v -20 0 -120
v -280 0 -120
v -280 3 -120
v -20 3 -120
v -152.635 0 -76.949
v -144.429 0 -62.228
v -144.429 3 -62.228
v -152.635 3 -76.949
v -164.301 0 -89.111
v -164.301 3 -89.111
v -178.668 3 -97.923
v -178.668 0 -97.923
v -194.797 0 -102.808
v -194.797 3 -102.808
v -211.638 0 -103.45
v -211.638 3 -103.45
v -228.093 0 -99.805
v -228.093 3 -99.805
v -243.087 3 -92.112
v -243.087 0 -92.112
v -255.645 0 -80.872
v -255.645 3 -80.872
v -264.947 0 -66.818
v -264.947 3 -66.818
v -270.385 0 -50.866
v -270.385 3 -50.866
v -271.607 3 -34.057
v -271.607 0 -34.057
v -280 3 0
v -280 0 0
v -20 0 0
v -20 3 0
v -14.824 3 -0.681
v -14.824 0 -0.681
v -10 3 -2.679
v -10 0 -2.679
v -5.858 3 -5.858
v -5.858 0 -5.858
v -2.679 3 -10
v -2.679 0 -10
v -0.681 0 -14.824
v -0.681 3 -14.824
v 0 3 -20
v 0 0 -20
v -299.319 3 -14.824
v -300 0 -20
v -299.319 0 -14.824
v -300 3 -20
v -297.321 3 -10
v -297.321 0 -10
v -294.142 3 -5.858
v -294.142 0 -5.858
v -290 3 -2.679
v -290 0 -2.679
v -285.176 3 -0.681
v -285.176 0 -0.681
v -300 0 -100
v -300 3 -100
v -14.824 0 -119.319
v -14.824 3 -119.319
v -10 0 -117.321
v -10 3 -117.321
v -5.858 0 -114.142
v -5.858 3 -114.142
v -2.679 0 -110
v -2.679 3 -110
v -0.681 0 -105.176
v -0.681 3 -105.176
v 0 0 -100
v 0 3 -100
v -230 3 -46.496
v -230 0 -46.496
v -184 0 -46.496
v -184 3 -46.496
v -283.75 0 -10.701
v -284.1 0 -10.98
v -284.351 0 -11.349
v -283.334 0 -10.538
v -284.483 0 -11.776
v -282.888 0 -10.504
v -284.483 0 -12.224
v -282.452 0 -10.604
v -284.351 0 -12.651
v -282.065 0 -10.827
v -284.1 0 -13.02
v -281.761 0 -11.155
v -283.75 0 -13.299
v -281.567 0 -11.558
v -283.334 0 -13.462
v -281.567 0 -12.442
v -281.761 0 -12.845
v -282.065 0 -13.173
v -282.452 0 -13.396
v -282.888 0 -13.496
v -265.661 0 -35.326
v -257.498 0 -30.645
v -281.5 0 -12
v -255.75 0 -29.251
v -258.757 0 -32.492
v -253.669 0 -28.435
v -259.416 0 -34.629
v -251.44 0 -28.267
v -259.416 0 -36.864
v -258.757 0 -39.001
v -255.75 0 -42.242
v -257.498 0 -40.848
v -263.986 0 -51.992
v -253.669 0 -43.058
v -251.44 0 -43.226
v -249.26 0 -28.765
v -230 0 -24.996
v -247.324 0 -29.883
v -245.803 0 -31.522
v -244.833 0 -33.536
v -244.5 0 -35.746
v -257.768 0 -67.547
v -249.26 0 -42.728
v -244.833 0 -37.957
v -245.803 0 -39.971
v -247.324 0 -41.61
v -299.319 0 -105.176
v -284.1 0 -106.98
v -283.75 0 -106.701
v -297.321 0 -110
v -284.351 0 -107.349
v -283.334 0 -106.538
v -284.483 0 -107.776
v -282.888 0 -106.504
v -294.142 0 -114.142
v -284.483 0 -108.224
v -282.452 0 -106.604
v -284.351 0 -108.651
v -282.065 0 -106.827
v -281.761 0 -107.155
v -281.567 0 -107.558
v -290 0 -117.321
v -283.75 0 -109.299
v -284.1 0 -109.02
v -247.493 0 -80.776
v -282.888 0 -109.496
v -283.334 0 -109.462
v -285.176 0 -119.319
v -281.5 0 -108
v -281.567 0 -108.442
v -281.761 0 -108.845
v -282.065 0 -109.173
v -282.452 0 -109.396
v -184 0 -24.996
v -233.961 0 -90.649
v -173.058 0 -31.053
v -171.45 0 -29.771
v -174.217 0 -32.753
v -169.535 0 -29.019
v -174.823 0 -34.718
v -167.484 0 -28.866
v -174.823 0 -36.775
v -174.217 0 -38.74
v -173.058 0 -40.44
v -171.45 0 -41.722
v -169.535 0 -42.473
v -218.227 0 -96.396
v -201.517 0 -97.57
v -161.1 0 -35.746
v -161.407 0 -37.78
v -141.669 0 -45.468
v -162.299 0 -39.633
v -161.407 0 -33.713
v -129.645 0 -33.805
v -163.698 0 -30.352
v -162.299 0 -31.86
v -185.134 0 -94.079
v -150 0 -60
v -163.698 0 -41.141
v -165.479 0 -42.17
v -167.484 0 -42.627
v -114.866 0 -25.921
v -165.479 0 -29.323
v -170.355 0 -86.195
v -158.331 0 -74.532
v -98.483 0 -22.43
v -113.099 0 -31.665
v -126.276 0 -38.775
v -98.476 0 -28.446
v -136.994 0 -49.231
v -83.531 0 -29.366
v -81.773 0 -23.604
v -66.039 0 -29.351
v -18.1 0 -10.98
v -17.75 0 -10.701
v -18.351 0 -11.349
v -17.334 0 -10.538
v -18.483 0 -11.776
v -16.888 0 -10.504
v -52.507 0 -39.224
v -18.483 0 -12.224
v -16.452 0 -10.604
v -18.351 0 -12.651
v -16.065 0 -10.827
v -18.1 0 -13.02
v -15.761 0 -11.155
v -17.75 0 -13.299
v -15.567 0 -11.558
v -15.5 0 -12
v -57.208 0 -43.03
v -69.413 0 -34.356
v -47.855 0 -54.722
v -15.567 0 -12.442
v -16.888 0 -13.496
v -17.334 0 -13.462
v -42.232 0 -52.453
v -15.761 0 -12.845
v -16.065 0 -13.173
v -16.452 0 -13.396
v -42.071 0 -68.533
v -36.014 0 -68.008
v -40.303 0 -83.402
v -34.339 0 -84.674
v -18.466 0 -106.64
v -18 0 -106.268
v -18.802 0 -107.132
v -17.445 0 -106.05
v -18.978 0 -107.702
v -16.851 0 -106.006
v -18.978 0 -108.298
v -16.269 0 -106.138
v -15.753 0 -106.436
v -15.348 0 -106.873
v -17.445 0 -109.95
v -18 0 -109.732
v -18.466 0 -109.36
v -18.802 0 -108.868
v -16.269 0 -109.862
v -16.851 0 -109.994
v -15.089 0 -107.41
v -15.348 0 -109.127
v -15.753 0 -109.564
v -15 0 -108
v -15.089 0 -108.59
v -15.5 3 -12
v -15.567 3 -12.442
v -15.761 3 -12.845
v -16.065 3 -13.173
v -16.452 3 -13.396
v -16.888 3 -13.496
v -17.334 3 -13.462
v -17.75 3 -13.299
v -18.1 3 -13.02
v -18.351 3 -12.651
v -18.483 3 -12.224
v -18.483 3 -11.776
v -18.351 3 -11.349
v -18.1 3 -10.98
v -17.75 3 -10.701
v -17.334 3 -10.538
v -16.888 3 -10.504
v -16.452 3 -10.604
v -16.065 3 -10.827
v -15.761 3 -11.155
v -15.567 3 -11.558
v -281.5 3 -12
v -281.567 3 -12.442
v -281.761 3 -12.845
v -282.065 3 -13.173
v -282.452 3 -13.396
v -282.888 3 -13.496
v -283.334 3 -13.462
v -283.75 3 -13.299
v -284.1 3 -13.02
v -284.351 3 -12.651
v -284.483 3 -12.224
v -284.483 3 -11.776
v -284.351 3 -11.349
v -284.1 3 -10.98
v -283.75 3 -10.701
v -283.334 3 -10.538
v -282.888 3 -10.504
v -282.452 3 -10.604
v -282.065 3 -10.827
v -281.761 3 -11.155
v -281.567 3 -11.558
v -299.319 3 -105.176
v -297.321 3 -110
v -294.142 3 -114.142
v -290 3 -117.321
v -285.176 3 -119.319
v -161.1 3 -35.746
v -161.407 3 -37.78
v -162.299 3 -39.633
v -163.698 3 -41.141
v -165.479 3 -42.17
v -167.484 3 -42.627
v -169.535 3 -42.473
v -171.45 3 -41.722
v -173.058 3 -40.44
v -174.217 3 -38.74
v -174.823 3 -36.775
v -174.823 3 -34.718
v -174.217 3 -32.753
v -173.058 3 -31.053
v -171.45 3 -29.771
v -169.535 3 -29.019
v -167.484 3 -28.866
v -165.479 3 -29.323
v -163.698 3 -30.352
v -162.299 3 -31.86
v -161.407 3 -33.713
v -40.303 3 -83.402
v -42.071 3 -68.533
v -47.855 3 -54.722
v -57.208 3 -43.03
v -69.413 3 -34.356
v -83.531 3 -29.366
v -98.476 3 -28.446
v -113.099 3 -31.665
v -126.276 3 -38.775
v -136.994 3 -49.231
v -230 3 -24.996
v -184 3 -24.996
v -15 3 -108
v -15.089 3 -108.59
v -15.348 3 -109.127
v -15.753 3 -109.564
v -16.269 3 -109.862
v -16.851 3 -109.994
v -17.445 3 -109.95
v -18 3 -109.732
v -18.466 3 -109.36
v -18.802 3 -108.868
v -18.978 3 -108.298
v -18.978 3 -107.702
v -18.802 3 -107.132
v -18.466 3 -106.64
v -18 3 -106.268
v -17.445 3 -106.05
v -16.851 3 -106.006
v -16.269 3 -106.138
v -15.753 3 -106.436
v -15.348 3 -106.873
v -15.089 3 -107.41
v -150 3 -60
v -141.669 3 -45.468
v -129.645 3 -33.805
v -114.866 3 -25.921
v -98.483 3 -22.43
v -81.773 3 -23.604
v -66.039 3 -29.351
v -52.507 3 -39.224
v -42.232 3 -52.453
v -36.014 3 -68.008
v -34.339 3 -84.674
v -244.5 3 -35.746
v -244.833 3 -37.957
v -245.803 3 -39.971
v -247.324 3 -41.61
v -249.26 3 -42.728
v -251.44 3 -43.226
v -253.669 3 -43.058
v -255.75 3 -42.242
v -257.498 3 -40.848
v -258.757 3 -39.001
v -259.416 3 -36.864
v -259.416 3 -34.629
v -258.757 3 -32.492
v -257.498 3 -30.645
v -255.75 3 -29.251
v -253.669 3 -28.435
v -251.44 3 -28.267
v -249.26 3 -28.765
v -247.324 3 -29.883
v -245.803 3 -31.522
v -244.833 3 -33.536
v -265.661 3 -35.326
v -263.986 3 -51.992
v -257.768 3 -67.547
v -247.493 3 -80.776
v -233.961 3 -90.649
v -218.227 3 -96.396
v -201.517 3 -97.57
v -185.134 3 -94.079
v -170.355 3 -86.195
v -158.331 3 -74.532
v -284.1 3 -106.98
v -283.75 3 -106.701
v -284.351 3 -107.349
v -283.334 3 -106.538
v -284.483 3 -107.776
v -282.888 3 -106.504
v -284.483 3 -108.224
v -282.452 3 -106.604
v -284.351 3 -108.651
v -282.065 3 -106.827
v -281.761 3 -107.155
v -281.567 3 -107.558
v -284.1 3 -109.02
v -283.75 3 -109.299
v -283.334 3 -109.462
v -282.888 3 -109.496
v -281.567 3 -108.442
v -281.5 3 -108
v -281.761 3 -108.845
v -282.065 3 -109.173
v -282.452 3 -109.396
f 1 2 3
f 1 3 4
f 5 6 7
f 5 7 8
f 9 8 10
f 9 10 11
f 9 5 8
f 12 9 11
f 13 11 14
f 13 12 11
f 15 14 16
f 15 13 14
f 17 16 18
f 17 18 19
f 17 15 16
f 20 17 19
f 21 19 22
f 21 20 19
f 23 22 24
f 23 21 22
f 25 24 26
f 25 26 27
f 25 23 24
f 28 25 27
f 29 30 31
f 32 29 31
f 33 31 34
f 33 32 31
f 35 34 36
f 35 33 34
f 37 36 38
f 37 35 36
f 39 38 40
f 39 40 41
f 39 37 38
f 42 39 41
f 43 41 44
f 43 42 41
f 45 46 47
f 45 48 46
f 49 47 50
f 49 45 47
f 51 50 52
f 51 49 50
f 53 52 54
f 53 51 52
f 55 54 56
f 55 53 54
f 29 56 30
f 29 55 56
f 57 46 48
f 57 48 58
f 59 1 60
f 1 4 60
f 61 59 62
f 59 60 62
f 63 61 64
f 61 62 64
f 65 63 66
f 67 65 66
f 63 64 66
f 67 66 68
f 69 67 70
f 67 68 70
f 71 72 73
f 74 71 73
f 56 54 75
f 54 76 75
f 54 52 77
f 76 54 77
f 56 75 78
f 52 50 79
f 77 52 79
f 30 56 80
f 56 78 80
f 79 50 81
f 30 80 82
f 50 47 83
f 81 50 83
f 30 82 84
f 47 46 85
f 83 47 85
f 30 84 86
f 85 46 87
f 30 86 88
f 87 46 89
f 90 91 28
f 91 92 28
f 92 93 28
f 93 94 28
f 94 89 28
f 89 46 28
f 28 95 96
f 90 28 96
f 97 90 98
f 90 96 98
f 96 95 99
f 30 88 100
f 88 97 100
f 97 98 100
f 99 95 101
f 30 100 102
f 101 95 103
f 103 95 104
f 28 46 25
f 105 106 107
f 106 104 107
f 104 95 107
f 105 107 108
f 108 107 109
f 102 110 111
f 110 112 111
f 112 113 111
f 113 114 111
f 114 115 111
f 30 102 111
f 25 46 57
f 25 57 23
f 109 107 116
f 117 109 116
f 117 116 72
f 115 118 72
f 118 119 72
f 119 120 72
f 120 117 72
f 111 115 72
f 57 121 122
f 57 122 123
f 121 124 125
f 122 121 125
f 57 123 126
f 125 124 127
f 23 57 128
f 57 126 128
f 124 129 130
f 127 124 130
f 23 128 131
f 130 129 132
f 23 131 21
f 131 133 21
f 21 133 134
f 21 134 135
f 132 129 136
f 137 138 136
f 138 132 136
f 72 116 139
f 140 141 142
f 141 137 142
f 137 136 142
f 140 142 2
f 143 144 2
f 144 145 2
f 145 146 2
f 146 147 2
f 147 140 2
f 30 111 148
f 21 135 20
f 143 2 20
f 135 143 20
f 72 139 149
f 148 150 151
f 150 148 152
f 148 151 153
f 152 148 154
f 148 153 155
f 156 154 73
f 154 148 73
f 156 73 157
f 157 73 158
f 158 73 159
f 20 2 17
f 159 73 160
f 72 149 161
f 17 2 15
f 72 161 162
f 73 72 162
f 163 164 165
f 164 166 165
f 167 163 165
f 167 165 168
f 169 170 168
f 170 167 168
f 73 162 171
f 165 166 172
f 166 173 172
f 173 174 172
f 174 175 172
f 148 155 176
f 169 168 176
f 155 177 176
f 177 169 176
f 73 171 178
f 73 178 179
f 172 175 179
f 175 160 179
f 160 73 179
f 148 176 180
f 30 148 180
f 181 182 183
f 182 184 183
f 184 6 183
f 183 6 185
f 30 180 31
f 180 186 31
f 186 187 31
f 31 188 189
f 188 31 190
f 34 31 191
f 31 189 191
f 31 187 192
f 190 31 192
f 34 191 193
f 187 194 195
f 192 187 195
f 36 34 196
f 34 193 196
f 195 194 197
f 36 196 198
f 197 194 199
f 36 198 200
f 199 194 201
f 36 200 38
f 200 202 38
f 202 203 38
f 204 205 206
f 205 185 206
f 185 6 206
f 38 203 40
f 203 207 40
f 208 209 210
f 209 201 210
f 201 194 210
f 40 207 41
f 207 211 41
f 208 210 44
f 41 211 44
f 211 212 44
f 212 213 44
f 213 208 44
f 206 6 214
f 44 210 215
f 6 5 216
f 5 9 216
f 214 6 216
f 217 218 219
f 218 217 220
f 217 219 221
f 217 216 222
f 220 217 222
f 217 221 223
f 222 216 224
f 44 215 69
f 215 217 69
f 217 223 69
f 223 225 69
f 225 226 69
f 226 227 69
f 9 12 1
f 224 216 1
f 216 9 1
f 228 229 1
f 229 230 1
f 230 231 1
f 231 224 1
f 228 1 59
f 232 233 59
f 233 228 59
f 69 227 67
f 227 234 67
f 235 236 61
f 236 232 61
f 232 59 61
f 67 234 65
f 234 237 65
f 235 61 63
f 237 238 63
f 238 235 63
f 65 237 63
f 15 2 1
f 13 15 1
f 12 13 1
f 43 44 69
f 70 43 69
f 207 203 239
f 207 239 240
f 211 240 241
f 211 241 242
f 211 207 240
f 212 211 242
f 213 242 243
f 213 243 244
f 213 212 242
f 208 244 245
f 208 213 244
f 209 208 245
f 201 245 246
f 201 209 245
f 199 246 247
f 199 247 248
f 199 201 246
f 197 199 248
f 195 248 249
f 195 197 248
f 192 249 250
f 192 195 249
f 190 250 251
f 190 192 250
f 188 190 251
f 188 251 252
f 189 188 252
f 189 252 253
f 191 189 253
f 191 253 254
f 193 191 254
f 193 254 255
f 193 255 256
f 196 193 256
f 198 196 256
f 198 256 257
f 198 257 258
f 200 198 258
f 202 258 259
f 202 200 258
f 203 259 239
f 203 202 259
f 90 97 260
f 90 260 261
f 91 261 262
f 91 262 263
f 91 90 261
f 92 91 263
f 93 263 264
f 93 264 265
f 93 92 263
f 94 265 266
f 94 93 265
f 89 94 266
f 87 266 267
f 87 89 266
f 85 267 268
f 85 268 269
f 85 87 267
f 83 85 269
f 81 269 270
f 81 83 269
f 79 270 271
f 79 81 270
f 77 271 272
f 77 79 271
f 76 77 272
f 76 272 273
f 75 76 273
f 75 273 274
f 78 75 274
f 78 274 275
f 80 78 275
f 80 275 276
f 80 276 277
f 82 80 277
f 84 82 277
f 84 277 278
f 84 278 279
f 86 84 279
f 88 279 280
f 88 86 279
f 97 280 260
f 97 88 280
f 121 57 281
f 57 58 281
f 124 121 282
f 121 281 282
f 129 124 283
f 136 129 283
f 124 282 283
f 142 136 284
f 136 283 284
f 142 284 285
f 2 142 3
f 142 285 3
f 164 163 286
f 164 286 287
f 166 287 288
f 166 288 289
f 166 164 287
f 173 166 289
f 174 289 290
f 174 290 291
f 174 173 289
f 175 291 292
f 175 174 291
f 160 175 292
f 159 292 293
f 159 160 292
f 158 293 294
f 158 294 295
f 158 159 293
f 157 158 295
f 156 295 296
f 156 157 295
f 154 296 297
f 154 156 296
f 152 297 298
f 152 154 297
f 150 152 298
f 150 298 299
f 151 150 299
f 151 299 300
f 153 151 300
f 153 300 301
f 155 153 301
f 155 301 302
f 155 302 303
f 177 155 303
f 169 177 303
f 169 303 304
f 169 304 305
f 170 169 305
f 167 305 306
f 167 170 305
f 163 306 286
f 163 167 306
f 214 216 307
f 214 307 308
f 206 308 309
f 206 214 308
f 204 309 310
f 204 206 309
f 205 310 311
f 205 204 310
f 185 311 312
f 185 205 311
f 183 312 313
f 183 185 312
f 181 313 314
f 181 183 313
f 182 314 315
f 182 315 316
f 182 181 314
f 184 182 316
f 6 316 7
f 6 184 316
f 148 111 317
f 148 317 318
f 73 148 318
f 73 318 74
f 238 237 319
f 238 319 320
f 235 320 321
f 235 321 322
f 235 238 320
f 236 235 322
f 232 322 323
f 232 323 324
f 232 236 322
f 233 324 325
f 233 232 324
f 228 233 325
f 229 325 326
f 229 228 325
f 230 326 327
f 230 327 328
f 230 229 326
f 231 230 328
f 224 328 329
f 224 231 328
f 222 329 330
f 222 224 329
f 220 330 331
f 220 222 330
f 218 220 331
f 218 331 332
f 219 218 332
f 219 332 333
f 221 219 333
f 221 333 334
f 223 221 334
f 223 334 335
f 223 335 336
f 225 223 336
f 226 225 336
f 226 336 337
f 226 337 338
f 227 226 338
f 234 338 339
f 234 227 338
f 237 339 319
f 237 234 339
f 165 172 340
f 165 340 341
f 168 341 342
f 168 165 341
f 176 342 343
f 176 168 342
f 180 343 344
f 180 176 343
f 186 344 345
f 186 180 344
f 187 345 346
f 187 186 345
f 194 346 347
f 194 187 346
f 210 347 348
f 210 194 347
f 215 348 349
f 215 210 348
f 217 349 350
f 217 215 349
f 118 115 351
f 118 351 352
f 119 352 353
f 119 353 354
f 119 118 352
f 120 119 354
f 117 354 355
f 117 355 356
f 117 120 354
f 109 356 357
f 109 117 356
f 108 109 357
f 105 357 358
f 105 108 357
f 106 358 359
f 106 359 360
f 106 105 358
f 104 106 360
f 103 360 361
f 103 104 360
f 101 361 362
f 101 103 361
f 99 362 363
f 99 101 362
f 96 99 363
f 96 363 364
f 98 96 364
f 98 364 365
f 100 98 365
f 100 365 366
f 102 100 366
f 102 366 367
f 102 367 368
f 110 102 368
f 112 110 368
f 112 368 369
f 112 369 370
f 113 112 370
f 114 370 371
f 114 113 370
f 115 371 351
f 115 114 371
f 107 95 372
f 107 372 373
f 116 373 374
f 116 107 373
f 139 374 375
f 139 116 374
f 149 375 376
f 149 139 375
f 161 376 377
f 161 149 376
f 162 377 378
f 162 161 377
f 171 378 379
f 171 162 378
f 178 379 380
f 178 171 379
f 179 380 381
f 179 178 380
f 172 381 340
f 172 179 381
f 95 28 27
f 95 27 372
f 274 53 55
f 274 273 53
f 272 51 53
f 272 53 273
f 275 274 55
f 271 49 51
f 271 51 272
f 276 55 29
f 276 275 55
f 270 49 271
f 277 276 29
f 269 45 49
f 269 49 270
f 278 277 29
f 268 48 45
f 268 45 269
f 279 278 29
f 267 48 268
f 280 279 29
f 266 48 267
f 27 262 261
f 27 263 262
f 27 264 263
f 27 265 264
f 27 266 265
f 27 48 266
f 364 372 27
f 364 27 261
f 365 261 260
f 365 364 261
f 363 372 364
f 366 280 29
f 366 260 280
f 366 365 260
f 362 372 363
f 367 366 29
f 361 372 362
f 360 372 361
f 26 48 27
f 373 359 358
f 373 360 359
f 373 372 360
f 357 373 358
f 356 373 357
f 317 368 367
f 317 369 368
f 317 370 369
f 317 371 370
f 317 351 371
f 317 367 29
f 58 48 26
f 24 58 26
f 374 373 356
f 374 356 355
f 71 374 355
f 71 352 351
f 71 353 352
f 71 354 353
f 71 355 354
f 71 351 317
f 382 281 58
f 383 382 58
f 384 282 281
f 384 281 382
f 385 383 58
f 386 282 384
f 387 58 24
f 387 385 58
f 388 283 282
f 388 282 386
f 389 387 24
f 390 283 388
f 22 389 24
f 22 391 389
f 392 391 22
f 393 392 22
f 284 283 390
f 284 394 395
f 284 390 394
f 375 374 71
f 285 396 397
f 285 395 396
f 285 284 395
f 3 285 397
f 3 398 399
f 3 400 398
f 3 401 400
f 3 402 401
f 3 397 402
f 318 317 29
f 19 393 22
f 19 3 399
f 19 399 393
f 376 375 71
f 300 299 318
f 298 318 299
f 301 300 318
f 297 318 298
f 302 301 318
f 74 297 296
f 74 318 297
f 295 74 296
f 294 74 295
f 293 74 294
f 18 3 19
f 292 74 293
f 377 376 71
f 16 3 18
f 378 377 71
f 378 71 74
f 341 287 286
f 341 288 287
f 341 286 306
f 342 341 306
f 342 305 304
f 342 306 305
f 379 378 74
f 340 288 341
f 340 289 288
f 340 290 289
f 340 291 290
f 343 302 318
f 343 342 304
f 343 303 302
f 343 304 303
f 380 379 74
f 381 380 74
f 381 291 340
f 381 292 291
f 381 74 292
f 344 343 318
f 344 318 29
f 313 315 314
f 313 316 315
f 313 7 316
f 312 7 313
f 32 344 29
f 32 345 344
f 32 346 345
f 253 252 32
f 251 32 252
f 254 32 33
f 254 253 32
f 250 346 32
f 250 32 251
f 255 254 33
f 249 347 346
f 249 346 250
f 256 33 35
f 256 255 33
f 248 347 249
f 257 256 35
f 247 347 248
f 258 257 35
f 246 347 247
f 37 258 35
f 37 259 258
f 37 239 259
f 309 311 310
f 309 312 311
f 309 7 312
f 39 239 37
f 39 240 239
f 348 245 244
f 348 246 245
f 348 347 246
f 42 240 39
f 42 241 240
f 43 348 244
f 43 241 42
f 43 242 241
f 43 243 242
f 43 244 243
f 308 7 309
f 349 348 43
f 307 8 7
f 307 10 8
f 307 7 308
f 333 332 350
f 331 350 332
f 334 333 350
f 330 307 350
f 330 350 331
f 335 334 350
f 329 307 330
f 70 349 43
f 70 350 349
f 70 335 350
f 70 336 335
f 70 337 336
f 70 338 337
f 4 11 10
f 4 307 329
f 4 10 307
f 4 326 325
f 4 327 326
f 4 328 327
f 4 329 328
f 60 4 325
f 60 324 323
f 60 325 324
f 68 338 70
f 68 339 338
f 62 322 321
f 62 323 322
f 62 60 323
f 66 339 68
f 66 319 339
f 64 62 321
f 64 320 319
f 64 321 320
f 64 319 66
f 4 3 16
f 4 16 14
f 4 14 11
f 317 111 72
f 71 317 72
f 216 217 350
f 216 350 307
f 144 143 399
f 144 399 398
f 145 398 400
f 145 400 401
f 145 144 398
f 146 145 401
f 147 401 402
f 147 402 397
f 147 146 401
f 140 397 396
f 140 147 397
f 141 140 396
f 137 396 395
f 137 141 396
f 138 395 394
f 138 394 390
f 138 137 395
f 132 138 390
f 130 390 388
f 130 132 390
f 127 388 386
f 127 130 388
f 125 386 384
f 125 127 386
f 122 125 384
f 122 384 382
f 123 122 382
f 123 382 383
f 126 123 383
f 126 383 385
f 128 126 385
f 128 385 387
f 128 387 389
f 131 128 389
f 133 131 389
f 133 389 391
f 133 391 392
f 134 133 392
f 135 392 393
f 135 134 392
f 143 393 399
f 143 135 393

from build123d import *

# Parameters (mm, degrees)
SKETCH_2_W      = 300
SKETCH_2_H      = 120
SKETCH_2_R      = 1.5
SKETCH_2_R_2    = 2
SKETCH_2_R_3    = 6.9
SKETCH_2_R_4    = 7.5
SKETCH_2_W_2    = 46
SKETCH_2_H_2    = 21.5
EXTRUDE_2_DEPTH = 3
FILLET_1_R      = 20


with BuildPart() as part:
    # Эскиз2 → Бобышка-Вытянуть2 (new body)
    with BuildSketch(Plane(origin=(0, 0, 0), x_dir=(1, 0, 0), z_dir=(0, 1, 0))):
        with Locations((-150, 60)):
            Rectangle(SKETCH_2_W, SKETCH_2_H)
        with Locations((-283, 108)):
            Circle(SKETCH_2_R, mode=Mode.SUBTRACT)
        with Locations((-17, 108)):
            Circle(SKETCH_2_R_2, mode=Mode.SUBTRACT)
        with Locations((-17, 12)):
            Circle(SKETCH_2_R, mode=Mode.SUBTRACT)
        with Locations((-283, 12)):
            Circle(SKETCH_2_R, mode=Mode.SUBTRACT)
        with Locations((-168, 35.746485704)):
            Circle(SKETCH_2_R_3, mode=Mode.SUBTRACT)
        with Locations((-252, 35.746485704)):
            Circle(SKETCH_2_R_4, mode=Mode.SUBTRACT)
        with BuildLine():
            Line((-271.607074704, 34.057157396), (-265.660946054, 35.325664842))
            ThreePointArc((-265.660946054, 35.325664842), (-218.226909759, 96.396129604), (-150, 60))
            ThreePointArc((-150, 60), (-81.773090241, 23.603870396), (-34.339053946, 84.674335158))
            Line((-34.339053946, 84.674335158), (-40.302985362, 83.402029789))
            ThreePointArc((-40.302985362, 83.402029789), (-83.530907836, 29.366412701), (-144.429139855, 62.228344058))
            ThreePointArc((-144.429139855, 62.228344058), (-219.982275004, 102.154609074), (-271.607074704, 34.057157396))
        make_face(mode=Mode.SUBTRACT)
        with Locations((-207, 35.746485704)):
            Rectangle(SKETCH_2_W_2, SKETCH_2_H_2, mode=Mode.SUBTRACT)
    extrude(amount=EXTRUDE_2_DEPTH)

    # Скругление1
    fillet_1_edges = [part.edges().sort_by_distance(p)[0] for p in [
        (0, 1.5, 0),
        (-300, 1.5, 0),
        (-300, 1.5, -120),
        (0, 1.5, -120),
    ]]
    fillet(fillet_1_edges, radius=FILLET_1_R)


solid = part.part
